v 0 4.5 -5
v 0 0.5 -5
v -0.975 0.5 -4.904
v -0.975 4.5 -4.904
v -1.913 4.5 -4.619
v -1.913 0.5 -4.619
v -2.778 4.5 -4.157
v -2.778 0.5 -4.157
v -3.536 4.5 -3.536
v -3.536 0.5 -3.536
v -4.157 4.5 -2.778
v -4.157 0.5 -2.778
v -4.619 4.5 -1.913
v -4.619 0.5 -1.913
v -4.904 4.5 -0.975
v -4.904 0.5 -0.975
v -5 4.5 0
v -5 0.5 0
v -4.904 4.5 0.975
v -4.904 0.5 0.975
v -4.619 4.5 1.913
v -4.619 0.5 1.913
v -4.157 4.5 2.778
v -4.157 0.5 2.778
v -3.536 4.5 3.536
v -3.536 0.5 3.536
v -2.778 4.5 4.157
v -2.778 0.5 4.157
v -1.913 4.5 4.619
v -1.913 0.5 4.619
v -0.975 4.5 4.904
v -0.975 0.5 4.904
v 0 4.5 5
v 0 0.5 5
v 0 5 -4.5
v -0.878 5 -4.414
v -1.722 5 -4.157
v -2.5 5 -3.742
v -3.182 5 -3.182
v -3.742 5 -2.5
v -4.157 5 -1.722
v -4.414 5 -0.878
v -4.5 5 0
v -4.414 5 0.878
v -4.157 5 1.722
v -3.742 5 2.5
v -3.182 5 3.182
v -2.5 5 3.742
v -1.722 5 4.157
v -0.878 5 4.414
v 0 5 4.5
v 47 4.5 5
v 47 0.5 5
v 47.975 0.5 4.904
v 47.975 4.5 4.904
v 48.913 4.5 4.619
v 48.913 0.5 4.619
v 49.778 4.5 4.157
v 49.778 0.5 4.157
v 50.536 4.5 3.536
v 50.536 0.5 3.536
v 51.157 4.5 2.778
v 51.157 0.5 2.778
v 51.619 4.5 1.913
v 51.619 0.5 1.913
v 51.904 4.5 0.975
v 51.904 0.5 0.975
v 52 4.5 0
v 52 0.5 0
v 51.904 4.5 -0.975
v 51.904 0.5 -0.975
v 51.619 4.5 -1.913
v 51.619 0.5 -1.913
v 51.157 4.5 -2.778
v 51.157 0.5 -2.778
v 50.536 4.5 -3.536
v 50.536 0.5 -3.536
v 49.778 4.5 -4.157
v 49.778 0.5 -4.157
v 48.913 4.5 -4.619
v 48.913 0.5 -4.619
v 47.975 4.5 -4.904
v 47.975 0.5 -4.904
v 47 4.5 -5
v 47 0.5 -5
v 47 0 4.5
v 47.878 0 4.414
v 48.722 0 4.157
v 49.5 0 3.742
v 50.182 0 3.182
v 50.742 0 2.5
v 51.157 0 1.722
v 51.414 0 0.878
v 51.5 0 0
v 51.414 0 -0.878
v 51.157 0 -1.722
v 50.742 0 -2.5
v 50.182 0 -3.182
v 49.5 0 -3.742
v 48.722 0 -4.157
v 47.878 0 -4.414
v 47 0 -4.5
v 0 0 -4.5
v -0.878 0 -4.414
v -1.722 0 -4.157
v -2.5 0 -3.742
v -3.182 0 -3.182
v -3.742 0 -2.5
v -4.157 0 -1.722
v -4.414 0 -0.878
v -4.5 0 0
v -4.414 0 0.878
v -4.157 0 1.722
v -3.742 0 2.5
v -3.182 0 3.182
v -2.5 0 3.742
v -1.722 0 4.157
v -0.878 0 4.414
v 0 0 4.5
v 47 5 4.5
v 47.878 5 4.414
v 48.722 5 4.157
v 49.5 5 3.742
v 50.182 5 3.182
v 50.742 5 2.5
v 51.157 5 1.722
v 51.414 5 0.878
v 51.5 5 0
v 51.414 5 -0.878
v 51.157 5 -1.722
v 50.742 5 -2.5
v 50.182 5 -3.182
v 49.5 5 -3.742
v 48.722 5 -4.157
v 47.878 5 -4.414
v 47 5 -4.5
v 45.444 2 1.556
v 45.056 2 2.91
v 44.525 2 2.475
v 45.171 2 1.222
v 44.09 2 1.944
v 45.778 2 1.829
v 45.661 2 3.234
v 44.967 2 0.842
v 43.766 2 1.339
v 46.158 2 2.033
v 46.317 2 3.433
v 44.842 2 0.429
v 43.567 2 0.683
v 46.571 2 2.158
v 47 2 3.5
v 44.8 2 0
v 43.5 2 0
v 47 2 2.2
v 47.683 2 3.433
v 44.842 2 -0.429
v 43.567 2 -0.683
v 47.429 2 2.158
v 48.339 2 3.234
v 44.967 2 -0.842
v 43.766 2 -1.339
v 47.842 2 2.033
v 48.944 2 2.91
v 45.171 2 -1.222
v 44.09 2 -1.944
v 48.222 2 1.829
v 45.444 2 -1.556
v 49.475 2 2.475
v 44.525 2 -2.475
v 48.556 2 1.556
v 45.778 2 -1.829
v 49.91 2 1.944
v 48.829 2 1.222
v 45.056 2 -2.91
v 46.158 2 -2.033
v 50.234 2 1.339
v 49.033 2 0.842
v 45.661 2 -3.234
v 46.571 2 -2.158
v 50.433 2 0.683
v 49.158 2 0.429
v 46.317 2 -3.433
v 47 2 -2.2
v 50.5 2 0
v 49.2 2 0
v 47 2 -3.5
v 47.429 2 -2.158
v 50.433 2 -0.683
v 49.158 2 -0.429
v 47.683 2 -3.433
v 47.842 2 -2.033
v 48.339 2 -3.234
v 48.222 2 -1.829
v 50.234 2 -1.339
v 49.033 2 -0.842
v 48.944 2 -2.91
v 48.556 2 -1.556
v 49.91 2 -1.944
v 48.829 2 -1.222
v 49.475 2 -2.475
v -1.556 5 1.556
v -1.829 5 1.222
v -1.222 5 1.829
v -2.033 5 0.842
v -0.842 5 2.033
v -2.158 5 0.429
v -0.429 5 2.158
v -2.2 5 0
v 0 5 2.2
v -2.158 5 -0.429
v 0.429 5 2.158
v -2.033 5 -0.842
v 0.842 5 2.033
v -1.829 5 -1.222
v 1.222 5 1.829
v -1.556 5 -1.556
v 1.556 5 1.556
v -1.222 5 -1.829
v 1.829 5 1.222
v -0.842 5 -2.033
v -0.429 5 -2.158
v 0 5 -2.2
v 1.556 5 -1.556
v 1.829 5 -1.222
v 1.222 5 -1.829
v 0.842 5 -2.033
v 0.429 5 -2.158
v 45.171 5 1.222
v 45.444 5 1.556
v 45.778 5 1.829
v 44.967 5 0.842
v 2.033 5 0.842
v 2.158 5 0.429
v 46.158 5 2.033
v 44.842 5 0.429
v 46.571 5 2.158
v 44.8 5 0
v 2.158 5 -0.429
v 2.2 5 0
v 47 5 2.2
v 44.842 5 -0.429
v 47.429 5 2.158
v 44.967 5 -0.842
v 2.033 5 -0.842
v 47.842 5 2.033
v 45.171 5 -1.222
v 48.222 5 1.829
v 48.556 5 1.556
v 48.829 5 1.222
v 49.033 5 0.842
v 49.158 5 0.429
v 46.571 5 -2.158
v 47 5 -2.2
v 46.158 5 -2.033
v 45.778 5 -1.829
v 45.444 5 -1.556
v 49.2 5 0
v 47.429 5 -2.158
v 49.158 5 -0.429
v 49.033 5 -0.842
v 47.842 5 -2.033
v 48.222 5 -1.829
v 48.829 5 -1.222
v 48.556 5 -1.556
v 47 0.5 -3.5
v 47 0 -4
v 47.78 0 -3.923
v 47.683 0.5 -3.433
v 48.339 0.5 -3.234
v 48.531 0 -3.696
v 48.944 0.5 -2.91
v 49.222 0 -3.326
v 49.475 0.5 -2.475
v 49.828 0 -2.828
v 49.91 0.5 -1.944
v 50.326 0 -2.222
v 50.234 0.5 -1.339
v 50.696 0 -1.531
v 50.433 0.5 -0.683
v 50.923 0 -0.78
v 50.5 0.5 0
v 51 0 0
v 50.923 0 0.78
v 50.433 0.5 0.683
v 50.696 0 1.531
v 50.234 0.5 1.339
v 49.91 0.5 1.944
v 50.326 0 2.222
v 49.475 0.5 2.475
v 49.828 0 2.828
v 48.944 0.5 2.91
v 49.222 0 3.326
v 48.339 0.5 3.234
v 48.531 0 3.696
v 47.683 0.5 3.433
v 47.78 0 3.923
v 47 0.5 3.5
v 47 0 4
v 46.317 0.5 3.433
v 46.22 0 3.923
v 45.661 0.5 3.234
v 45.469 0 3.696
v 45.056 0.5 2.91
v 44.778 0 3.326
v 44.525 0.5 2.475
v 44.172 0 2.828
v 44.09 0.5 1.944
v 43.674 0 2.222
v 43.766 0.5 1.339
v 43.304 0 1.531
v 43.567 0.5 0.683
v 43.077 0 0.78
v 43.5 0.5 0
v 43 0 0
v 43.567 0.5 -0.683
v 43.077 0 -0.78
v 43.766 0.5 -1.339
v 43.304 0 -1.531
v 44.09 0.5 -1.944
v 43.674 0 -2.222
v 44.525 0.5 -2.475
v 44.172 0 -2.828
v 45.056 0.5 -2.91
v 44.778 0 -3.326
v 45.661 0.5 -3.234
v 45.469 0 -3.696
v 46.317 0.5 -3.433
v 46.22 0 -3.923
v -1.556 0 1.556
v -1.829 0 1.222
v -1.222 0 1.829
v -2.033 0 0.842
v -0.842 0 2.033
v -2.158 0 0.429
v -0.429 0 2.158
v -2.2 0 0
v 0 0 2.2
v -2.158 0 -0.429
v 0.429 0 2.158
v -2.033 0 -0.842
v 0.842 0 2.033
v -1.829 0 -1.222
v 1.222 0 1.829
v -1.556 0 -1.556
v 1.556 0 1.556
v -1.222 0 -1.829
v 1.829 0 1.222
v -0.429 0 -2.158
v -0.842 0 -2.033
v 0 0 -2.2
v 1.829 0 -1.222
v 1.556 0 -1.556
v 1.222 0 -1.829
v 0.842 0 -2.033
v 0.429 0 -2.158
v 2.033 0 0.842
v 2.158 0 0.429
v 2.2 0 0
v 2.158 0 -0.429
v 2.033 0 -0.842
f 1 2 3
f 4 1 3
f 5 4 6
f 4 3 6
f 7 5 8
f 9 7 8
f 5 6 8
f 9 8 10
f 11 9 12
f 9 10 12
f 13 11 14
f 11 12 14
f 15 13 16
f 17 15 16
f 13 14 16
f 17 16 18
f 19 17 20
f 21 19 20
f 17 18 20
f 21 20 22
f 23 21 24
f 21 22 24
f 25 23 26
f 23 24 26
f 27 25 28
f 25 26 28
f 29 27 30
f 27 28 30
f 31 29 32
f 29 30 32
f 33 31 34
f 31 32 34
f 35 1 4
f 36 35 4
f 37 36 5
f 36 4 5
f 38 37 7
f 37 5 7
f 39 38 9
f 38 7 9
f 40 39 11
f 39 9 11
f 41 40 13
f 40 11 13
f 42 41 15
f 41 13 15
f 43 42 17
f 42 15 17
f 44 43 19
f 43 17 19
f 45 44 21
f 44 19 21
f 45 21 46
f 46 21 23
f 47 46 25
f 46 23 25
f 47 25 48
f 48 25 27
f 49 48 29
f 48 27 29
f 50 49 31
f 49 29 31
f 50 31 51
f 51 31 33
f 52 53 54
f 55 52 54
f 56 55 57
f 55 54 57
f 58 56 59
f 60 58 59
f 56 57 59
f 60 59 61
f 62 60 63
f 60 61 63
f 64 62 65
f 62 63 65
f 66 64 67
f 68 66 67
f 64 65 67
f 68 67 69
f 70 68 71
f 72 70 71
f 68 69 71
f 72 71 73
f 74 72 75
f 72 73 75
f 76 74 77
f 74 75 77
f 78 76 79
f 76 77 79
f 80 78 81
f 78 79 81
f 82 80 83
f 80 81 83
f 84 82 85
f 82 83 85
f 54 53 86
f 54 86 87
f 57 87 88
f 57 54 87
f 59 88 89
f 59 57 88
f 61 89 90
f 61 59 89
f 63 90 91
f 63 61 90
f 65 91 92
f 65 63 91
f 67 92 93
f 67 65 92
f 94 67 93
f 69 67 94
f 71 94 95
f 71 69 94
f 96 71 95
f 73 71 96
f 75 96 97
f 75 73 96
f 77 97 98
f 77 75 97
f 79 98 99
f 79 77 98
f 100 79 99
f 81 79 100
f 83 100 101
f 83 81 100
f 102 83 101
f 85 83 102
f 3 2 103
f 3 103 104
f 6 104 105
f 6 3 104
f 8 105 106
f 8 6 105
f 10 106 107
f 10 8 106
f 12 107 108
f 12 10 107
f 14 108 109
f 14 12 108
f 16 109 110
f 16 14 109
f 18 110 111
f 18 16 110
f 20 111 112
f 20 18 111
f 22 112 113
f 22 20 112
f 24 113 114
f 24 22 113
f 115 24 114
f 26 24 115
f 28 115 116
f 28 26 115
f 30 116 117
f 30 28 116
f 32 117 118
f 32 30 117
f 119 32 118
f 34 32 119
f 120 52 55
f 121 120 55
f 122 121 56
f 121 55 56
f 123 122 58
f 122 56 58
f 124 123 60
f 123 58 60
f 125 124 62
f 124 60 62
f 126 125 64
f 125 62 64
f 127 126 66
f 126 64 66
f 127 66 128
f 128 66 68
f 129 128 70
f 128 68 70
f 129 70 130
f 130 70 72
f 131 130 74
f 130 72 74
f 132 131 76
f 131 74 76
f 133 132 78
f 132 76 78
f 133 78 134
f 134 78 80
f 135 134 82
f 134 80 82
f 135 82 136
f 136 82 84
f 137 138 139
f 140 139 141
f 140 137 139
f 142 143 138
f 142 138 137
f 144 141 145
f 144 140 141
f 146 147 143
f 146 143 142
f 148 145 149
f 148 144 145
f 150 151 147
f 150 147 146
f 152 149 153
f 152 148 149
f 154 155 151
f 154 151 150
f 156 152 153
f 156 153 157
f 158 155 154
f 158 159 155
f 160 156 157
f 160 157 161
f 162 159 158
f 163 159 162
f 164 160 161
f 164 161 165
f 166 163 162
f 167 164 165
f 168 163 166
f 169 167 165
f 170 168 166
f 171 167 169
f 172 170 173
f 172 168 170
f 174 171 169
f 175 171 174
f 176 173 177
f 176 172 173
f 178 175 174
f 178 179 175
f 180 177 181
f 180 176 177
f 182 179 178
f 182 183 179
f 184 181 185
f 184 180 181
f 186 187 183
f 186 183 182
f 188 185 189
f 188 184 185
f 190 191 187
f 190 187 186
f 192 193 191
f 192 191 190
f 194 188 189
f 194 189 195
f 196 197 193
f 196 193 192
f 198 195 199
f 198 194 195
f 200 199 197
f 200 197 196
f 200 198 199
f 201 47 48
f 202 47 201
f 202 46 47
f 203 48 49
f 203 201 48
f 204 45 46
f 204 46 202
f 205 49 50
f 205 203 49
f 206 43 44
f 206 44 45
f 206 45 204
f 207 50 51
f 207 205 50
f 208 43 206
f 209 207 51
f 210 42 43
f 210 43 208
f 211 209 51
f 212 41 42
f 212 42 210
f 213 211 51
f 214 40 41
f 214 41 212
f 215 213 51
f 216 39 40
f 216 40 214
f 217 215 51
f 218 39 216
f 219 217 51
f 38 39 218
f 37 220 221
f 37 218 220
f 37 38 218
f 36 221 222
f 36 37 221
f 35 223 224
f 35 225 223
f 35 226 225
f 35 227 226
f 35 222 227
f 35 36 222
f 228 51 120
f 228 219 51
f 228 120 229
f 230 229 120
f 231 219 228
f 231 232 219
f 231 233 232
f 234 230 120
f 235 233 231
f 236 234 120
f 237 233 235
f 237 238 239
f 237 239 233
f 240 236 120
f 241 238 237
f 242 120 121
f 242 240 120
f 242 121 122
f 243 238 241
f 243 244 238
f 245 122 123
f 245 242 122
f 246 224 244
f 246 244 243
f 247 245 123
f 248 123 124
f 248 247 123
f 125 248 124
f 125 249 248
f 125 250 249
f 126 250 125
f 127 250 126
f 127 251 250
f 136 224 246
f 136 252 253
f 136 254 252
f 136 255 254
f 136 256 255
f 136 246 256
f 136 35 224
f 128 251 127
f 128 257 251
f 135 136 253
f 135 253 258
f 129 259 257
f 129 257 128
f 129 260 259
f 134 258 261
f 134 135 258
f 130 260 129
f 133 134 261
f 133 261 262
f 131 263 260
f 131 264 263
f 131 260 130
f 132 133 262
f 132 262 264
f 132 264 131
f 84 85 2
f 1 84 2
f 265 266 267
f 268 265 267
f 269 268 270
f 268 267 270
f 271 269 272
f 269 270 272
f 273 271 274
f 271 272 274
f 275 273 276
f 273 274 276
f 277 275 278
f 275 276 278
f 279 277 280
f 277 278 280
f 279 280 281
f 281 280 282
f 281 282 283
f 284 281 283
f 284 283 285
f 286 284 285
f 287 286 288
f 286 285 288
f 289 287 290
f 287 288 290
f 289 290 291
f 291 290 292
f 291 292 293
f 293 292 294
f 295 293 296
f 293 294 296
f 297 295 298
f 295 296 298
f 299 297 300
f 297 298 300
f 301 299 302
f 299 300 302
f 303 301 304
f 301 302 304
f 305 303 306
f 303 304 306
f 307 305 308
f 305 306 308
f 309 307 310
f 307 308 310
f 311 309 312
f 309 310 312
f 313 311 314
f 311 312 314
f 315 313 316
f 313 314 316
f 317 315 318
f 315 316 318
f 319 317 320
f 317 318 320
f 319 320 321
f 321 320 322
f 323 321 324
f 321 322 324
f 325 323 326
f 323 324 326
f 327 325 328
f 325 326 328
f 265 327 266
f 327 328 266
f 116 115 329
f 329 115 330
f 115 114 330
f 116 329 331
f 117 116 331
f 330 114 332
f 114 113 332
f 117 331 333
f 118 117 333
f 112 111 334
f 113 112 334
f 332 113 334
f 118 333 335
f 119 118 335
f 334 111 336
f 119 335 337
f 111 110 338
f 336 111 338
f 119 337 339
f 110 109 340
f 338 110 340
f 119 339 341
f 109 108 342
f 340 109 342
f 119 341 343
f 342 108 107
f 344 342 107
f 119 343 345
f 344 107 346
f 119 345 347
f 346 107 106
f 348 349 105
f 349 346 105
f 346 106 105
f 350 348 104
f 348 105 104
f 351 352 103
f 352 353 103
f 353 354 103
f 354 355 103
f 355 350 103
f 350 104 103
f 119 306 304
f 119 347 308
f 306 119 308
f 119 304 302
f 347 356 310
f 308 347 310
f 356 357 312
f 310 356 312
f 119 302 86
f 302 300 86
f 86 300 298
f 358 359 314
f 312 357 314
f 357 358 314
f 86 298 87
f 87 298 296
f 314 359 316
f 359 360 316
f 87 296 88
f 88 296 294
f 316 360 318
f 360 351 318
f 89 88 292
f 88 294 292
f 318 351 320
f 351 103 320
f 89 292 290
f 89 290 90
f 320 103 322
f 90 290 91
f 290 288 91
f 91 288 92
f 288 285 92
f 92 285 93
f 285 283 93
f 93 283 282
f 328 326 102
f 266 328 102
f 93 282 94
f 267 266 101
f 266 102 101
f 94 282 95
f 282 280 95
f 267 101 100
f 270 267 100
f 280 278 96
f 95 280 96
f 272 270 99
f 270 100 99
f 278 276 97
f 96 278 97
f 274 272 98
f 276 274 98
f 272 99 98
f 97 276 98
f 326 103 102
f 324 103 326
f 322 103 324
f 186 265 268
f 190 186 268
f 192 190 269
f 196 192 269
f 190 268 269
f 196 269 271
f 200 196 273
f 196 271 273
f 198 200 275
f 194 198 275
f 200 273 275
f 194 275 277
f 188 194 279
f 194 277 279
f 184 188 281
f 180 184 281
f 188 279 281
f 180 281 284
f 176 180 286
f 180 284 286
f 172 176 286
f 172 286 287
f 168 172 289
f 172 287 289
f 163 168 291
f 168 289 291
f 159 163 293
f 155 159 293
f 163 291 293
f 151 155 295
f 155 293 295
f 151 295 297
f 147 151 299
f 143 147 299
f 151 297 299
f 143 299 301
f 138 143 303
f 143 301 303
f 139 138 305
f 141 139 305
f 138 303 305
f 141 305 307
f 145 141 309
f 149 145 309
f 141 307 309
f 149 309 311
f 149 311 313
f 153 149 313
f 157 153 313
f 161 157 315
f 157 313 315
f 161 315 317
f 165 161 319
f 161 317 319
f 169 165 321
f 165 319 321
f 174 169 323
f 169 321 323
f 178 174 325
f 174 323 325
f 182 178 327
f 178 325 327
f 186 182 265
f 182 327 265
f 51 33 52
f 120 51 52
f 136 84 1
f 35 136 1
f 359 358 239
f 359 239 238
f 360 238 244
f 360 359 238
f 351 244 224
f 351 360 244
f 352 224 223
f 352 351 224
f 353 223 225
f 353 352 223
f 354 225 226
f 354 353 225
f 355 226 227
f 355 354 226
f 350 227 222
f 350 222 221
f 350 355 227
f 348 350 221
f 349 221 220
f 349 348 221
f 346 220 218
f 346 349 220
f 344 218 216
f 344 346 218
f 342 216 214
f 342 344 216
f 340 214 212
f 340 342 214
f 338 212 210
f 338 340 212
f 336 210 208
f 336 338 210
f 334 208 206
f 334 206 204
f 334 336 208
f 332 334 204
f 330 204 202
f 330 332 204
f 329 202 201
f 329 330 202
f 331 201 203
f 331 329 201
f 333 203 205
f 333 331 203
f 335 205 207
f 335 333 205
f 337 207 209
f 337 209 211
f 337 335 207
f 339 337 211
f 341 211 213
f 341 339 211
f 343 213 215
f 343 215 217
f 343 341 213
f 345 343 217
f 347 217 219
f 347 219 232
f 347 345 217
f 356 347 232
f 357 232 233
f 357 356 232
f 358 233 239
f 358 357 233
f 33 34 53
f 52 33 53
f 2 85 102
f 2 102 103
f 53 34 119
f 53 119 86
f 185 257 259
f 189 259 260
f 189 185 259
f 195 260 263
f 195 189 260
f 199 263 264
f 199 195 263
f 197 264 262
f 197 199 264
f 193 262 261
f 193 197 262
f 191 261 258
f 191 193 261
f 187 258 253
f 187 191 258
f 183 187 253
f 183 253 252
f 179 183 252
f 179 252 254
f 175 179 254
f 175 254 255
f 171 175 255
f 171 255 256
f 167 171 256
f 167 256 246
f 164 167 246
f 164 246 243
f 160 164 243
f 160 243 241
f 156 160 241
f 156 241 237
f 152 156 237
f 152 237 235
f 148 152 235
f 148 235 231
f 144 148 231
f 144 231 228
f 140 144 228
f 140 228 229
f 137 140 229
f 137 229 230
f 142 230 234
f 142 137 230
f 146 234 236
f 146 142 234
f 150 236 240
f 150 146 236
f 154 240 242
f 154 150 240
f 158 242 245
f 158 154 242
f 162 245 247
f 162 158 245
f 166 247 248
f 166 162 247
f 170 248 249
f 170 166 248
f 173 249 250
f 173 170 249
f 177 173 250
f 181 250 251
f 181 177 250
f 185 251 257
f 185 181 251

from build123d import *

# Parameters (mm, degrees)
EXTRUDE_START       = -0.0001
EXTRUDE_2_OUTLINE_R = 2.2
EXTRUDE_2_DEPTH     = 5.0001
SKETCH_3_R          = 3.5
SKETCH_3_R_2        = 2.2
CUT_EXTRUDE_1_DEPTH = 2
CHAMFER_1_SIZE      = 0.5


# Read off the part's stored shape, not the designer's step: 凸台-拉伸2
with BuildPart() as part:
    # 凸台-拉伸2 outline → 凸台-拉伸2 (new body)
    with BuildSketch(Plane(origin=(0, 0, 0), x_dir=(1, 0, 0), z_dir=(0, 1, 0)).offset(EXTRUDE_START)):
        with BuildLine():
            Line((47, 5), (0, 5))
            ThreePointArc((0, 5), (-5, 0), (0, -5))
            Line((0, -5), (47, -5))
            ThreePointArc((47, -5), (52, 0), (47, 5))
        make_face()
        Circle(EXTRUDE_2_OUTLINE_R, mode=Mode.SUBTRACT)
        with Locations((47, 0)):
            Circle(EXTRUDE_2_OUTLINE_R, mode=Mode.SUBTRACT)
    extrude(amount=EXTRUDE_2_DEPTH)

    # 草图3 → 切除-拉伸1 (cut)
    with BuildSketch(Plane.XZ.offset(0.0001)):
        with Locations(Location((47, 0, 0), (0, 0, 270))):
            Circle(SKETCH_3_R)
        with Locations(Location((47, 0, 0), (0, 0, 90))):
            Circle(SKETCH_3_R_2, mode=Mode.SUBTRACT)
    extrude(amount=-CUT_EXTRUDE_1_DEPTH, mode=Mode.SUBTRACT)

    # 倒角1
    chamfer_1_edges = [part.edges().sort_by_distance(p)[0] for p in [
        (52, -0.0001, 0),
        (23.5, -0.0001, -5),
        (-5, 5, 0),
        (23.5, 5, 5),
        (52, 5, 0),
        (23.5, 5, -5),
        (47, -0.0001, 3.5),
        (-5, -0.0001, 0),
        (23.5, -0.0001, 5),
    ]]
    chamfer(chamfer_1_edges, length=CHAMFER_1_SIZE)


solid = part.part
